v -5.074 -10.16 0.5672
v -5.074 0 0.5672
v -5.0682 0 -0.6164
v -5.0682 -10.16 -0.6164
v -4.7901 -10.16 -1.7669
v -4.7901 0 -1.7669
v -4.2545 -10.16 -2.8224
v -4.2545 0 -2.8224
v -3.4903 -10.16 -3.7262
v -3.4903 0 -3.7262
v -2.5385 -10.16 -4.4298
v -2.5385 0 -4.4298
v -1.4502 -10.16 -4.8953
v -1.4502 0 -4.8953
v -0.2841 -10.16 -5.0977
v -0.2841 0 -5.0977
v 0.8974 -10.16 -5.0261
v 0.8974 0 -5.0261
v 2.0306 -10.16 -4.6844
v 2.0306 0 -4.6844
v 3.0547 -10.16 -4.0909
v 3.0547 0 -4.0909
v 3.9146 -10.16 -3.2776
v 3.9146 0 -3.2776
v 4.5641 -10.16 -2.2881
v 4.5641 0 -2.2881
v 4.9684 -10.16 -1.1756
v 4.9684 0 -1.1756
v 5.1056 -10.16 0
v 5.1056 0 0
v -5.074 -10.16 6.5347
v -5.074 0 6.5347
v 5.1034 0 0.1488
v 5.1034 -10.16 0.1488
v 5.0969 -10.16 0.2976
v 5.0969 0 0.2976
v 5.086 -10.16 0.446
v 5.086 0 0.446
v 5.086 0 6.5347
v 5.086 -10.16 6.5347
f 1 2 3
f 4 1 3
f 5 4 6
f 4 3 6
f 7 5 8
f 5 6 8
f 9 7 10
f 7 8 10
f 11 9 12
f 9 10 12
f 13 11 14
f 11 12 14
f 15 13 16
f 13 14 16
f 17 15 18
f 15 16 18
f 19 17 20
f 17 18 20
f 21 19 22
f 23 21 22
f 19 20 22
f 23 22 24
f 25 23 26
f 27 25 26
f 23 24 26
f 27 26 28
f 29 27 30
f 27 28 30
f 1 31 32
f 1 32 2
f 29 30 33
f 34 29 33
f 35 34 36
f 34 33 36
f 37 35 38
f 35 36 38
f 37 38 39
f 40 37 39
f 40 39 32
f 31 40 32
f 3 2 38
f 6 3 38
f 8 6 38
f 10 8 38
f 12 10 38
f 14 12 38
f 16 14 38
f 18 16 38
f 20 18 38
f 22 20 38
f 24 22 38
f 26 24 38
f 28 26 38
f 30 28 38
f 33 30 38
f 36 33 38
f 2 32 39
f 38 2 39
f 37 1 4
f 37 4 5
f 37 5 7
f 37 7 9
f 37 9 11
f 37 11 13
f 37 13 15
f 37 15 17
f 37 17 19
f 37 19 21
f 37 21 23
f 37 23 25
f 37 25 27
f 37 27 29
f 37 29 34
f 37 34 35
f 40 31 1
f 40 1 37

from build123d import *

# Parameters (mm, degrees)
F1_DEPTH = 10.16
F2_DEPTH = 10.16


with BuildPart() as f1:
    # F0 (on Front) → F1 (new body)
    with BuildSketch(Plane.XZ):
        with BuildLine():
            Line((5.086044, 6.534736), (-5.073956, 6.534736))
            Line((-5.073956, 6.534736), (-5.073956, 0.567228))
            ThreePointArc((-5.073956, 0.567228), (0.060908, 5.1052), (5.086044, 0.446012))
            Line((5.086044, 0.446012), (5.086044, 6.534736))
        make_face()
    extrude(amount=F1_DEPTH)

    # F0 (on Front) → F2 (join)
    with BuildSketch(Plane.XZ):
        with BuildLine():
            ThreePointArc((5.086044, 0.446012), (0.060908, 5.1052), (-5.073956, 0.567228))
            ThreePointArc((-5.073956, 0.567228), (-0.284054, -5.097655), (5.105563, 0))
            ThreePointArc((5.105563, 0), (5.100681, 0.223219), (5.086044, 0.446012))
        make_face()
    extrude(amount=F2_DEPTH)


solid = f1.part
